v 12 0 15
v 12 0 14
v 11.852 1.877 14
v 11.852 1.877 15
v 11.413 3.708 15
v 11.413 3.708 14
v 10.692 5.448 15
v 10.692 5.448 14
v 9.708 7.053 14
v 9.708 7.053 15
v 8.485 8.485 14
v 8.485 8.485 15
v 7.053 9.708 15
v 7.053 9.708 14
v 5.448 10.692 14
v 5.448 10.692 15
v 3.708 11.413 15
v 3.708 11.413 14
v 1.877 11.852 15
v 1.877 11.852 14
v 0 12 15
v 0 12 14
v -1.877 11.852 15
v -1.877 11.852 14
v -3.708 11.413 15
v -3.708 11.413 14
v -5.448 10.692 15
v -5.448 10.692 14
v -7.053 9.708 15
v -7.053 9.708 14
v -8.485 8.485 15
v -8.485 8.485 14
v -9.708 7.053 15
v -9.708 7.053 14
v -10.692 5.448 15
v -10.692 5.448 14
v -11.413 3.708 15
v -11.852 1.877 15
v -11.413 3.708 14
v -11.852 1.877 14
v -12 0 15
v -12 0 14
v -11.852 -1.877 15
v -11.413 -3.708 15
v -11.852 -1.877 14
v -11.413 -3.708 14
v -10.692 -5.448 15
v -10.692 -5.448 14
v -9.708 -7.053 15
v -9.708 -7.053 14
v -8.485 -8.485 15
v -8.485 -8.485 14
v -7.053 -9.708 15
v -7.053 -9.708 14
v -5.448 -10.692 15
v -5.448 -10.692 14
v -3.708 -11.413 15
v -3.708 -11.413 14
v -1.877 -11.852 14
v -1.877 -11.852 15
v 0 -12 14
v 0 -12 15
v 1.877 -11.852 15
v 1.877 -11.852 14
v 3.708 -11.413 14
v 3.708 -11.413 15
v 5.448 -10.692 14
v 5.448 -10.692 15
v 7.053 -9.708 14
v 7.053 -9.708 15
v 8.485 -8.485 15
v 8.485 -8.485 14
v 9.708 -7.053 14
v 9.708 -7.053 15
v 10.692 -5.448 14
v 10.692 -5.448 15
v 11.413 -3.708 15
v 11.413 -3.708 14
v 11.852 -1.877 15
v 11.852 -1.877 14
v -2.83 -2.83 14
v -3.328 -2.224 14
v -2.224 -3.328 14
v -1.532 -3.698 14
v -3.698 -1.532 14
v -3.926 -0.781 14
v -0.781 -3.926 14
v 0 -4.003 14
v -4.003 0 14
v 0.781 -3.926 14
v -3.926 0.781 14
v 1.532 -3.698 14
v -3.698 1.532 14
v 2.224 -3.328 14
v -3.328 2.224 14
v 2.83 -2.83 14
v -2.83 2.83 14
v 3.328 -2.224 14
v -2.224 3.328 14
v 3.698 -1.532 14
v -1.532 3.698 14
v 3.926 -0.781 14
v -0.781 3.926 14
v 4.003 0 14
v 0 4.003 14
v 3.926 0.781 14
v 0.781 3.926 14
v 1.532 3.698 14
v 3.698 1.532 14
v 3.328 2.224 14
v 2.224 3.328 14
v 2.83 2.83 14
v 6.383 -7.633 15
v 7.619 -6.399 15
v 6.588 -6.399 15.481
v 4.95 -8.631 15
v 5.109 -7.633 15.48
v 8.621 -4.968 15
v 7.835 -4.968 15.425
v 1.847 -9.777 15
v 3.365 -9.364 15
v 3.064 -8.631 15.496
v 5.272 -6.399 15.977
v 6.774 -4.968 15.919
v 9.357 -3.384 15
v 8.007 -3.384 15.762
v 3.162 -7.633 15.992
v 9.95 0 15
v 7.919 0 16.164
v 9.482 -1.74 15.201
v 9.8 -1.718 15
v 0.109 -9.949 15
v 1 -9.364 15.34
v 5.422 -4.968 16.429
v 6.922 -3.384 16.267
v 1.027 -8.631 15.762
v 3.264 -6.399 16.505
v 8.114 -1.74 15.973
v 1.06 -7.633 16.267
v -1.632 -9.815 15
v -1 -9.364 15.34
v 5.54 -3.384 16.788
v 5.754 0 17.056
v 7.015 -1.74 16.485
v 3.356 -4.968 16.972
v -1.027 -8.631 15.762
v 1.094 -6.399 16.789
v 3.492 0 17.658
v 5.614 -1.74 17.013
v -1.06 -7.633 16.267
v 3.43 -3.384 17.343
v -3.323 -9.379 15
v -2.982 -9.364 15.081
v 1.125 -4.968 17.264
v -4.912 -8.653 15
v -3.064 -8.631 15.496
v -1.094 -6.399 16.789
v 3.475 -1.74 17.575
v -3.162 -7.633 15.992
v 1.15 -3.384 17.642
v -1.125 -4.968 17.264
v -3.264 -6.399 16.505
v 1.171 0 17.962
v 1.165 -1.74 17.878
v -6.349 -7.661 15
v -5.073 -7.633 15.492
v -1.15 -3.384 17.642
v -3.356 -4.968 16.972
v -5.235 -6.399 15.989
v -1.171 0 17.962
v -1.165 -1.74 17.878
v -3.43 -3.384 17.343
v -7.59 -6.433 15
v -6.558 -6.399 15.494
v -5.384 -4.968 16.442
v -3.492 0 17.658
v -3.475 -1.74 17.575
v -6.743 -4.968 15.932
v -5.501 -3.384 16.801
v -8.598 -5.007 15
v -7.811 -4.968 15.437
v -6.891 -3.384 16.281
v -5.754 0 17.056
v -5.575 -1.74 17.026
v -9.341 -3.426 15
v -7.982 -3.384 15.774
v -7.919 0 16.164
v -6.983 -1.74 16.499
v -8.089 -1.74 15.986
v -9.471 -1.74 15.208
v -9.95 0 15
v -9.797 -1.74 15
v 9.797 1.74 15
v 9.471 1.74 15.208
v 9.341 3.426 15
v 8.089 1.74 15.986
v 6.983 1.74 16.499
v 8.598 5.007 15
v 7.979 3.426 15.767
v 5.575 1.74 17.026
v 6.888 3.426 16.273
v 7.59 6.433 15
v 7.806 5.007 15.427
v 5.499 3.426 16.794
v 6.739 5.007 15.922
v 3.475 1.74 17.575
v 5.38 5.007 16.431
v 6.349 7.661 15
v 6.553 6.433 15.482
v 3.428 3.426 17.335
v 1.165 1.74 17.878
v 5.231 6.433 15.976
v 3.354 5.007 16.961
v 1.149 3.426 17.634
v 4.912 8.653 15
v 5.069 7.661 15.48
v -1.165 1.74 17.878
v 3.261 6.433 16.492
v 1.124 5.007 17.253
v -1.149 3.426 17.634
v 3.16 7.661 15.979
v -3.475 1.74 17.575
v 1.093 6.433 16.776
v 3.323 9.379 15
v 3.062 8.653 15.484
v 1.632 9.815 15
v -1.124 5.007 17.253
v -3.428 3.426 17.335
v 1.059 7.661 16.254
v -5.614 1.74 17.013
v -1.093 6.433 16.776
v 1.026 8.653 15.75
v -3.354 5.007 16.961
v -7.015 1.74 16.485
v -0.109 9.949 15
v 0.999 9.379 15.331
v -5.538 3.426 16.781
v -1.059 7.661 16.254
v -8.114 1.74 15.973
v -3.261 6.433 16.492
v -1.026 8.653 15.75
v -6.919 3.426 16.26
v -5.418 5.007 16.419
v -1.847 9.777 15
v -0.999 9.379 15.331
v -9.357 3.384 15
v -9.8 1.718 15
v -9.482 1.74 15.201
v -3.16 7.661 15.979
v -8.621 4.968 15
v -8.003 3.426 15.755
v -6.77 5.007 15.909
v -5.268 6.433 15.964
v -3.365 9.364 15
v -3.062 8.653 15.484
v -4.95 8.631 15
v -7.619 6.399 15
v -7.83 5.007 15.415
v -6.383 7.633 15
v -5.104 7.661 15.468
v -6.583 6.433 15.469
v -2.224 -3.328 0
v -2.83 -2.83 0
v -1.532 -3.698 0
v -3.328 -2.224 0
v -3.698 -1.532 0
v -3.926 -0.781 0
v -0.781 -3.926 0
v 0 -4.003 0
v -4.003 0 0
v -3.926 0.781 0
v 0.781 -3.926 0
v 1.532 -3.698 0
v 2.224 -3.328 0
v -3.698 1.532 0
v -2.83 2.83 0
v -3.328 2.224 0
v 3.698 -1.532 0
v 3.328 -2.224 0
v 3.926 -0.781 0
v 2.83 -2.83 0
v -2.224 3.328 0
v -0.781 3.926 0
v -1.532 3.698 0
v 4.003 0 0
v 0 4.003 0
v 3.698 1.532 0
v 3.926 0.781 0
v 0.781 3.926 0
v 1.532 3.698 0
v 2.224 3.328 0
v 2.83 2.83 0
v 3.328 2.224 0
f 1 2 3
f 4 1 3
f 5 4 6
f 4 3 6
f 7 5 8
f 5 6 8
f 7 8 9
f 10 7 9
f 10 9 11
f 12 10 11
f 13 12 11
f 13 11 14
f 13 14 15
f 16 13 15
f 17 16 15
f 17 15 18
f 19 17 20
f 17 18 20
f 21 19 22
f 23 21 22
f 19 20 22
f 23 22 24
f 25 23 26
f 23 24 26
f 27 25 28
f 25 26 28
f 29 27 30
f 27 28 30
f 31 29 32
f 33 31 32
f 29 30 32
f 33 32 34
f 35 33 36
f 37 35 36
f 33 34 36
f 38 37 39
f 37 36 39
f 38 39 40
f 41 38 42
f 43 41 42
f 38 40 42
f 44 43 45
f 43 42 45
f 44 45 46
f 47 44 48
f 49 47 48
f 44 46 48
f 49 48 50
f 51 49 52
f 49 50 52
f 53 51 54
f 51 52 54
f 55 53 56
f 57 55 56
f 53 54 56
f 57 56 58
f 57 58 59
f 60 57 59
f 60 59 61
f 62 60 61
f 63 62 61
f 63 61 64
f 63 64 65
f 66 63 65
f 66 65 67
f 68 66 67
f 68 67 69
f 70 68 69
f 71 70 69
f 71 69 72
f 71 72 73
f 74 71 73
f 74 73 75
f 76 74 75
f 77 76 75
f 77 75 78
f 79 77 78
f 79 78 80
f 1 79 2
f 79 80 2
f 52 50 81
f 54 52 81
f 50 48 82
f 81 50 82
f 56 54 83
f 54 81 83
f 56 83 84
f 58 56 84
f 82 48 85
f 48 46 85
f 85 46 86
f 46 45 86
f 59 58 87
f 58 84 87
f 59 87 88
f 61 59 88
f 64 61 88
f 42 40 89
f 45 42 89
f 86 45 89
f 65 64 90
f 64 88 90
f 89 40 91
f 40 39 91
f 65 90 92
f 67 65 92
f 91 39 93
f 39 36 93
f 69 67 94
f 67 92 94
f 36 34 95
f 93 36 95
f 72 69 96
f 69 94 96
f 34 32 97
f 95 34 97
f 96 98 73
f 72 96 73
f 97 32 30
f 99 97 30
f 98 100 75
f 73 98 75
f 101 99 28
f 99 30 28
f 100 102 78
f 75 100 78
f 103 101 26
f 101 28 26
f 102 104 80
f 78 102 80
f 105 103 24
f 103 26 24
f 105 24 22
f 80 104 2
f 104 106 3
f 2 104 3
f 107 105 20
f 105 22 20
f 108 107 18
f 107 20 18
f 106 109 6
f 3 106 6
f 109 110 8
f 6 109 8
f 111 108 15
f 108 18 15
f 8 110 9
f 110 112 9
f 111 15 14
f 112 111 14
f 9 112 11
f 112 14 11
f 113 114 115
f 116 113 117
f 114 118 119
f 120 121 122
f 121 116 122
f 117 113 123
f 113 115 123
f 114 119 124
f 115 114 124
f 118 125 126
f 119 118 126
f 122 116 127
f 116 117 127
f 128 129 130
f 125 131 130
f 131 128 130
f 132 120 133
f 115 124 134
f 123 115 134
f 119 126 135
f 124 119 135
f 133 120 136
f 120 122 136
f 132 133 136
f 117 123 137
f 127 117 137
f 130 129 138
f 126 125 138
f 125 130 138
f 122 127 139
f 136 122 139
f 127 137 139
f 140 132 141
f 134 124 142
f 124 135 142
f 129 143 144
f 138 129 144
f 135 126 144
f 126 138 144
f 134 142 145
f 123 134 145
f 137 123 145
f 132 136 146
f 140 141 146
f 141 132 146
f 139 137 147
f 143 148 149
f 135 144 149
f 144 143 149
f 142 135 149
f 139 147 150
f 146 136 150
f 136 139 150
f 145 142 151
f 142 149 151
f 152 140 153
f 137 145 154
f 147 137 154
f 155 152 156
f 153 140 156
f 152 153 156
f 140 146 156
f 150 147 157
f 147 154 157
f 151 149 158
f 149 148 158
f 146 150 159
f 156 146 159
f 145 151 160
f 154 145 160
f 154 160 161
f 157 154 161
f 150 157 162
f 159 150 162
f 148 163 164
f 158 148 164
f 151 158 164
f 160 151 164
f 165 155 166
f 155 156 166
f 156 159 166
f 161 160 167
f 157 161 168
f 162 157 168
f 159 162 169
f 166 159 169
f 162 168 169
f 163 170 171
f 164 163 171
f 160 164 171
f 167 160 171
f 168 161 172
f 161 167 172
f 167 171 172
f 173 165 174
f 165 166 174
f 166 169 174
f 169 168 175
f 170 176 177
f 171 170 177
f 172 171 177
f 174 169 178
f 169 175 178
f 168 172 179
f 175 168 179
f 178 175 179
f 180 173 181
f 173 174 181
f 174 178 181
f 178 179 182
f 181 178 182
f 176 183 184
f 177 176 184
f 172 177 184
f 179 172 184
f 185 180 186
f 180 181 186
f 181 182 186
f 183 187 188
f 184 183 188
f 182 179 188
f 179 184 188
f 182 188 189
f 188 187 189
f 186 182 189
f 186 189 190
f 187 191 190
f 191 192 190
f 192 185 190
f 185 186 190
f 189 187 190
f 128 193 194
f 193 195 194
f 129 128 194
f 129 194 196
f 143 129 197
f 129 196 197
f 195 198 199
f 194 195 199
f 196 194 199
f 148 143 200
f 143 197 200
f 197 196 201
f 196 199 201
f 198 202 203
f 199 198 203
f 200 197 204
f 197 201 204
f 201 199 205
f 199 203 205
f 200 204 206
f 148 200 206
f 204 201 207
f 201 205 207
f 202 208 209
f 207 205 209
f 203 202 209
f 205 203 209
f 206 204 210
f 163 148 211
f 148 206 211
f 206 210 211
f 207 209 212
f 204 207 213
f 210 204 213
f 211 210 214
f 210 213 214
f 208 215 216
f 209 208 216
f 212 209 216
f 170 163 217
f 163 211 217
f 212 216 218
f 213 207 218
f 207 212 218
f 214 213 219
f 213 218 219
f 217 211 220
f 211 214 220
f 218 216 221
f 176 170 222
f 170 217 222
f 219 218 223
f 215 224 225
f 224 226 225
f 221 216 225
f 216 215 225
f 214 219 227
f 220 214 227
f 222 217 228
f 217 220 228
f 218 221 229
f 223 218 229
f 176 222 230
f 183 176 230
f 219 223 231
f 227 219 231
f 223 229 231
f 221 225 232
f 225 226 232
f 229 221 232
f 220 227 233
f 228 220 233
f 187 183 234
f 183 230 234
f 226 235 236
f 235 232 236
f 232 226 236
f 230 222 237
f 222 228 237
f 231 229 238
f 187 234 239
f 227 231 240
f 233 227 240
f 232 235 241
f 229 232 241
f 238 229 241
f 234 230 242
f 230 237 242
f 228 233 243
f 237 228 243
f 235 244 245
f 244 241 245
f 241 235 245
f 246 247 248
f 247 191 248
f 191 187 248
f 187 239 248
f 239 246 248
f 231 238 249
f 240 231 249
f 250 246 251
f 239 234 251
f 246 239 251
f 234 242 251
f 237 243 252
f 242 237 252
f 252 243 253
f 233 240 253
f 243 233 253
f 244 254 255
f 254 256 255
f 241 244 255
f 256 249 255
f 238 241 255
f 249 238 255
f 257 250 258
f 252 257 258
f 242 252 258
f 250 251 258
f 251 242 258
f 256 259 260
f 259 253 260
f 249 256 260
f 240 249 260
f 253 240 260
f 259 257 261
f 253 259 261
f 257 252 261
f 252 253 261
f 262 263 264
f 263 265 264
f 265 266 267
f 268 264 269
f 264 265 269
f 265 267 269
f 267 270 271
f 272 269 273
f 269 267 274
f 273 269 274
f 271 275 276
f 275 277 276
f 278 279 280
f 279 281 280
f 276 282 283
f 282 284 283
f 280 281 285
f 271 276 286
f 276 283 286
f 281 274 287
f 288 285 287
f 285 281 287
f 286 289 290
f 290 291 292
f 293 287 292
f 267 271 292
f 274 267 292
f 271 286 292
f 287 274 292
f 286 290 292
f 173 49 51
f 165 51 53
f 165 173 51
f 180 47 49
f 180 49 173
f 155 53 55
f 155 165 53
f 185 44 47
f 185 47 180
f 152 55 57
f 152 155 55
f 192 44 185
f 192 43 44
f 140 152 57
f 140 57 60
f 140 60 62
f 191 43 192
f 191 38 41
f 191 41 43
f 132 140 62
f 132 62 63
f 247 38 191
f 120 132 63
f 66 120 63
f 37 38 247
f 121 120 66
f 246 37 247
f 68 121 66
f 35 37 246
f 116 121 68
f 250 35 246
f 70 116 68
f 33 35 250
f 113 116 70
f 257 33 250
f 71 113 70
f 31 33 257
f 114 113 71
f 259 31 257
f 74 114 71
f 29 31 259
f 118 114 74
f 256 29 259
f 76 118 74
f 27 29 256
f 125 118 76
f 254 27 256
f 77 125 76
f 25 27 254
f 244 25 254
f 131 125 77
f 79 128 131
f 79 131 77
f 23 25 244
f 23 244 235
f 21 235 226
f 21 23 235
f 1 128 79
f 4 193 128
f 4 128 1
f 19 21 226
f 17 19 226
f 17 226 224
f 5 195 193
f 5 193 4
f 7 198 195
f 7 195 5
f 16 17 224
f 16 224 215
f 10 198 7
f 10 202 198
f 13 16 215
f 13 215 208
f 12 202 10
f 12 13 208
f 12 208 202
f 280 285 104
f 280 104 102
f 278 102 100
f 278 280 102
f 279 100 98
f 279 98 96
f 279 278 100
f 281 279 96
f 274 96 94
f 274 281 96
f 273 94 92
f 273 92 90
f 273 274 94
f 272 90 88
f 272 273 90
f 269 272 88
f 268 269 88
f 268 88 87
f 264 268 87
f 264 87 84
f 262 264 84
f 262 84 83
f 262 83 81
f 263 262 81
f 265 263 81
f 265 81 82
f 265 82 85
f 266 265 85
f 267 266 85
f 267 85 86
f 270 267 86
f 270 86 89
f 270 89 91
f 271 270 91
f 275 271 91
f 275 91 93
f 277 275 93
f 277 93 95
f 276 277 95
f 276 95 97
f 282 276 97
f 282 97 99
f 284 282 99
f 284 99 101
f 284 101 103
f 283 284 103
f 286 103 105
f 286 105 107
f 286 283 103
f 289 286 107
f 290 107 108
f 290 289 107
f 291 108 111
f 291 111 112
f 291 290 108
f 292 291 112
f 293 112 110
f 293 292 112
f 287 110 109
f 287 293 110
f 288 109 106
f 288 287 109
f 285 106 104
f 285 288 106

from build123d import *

# Parameters (mm, degrees)
F1_ANGLE = 180
F2_R     = 18
F2_R_2   = 4.0025
F3_DEPTH = 14
F5_R     = 12
F6_DEPTH = 1
F7_R     = 4.0025
F8_DEPTH = 11


with BuildPart() as f1:
    # F0 (on Top) → F1 (revolve)
    with BuildSketch(Plane.XY):
        with BuildLine():
            ThreePointArc((0, -18), (12.727922, -12.727922), (18, 0))
            ThreePointArc((18, 0), (12.727922, 12.727922), (0, 18))
            Line((0, 18), (0, -18))
        make_face()
    revolve(axis=Axis((0, 0, 0), (0, -1, 0)), revolution_arc=F1_ANGLE)

    # F2 (on face) → F3 (cut)
    with BuildSketch(Plane(origin=(0, 0, 0), x_dir=(1, 0, 0), z_dir=(0, 0, -1))):
        Circle(F2_R)
        Circle(F2_R_2, mode=Mode.SUBTRACT)
    extrude(amount=-F3_DEPTH, mode=Mode.SUBTRACT)

    # F5 (on offset) → F6 (join)
    with BuildSketch(Plane.XY.offset(14)):
        Circle(F5_R)
    extrude(amount=F6_DEPTH)

    # F7 (on face) → F8 (join)
    with BuildSketch(Plane(origin=(0, 0, 0), x_dir=(1, 0, 0), z_dir=(0, 0, -1))):
        Circle(F7_R)
    extrude(amount=-F8_DEPTH)


solid = f1.part
